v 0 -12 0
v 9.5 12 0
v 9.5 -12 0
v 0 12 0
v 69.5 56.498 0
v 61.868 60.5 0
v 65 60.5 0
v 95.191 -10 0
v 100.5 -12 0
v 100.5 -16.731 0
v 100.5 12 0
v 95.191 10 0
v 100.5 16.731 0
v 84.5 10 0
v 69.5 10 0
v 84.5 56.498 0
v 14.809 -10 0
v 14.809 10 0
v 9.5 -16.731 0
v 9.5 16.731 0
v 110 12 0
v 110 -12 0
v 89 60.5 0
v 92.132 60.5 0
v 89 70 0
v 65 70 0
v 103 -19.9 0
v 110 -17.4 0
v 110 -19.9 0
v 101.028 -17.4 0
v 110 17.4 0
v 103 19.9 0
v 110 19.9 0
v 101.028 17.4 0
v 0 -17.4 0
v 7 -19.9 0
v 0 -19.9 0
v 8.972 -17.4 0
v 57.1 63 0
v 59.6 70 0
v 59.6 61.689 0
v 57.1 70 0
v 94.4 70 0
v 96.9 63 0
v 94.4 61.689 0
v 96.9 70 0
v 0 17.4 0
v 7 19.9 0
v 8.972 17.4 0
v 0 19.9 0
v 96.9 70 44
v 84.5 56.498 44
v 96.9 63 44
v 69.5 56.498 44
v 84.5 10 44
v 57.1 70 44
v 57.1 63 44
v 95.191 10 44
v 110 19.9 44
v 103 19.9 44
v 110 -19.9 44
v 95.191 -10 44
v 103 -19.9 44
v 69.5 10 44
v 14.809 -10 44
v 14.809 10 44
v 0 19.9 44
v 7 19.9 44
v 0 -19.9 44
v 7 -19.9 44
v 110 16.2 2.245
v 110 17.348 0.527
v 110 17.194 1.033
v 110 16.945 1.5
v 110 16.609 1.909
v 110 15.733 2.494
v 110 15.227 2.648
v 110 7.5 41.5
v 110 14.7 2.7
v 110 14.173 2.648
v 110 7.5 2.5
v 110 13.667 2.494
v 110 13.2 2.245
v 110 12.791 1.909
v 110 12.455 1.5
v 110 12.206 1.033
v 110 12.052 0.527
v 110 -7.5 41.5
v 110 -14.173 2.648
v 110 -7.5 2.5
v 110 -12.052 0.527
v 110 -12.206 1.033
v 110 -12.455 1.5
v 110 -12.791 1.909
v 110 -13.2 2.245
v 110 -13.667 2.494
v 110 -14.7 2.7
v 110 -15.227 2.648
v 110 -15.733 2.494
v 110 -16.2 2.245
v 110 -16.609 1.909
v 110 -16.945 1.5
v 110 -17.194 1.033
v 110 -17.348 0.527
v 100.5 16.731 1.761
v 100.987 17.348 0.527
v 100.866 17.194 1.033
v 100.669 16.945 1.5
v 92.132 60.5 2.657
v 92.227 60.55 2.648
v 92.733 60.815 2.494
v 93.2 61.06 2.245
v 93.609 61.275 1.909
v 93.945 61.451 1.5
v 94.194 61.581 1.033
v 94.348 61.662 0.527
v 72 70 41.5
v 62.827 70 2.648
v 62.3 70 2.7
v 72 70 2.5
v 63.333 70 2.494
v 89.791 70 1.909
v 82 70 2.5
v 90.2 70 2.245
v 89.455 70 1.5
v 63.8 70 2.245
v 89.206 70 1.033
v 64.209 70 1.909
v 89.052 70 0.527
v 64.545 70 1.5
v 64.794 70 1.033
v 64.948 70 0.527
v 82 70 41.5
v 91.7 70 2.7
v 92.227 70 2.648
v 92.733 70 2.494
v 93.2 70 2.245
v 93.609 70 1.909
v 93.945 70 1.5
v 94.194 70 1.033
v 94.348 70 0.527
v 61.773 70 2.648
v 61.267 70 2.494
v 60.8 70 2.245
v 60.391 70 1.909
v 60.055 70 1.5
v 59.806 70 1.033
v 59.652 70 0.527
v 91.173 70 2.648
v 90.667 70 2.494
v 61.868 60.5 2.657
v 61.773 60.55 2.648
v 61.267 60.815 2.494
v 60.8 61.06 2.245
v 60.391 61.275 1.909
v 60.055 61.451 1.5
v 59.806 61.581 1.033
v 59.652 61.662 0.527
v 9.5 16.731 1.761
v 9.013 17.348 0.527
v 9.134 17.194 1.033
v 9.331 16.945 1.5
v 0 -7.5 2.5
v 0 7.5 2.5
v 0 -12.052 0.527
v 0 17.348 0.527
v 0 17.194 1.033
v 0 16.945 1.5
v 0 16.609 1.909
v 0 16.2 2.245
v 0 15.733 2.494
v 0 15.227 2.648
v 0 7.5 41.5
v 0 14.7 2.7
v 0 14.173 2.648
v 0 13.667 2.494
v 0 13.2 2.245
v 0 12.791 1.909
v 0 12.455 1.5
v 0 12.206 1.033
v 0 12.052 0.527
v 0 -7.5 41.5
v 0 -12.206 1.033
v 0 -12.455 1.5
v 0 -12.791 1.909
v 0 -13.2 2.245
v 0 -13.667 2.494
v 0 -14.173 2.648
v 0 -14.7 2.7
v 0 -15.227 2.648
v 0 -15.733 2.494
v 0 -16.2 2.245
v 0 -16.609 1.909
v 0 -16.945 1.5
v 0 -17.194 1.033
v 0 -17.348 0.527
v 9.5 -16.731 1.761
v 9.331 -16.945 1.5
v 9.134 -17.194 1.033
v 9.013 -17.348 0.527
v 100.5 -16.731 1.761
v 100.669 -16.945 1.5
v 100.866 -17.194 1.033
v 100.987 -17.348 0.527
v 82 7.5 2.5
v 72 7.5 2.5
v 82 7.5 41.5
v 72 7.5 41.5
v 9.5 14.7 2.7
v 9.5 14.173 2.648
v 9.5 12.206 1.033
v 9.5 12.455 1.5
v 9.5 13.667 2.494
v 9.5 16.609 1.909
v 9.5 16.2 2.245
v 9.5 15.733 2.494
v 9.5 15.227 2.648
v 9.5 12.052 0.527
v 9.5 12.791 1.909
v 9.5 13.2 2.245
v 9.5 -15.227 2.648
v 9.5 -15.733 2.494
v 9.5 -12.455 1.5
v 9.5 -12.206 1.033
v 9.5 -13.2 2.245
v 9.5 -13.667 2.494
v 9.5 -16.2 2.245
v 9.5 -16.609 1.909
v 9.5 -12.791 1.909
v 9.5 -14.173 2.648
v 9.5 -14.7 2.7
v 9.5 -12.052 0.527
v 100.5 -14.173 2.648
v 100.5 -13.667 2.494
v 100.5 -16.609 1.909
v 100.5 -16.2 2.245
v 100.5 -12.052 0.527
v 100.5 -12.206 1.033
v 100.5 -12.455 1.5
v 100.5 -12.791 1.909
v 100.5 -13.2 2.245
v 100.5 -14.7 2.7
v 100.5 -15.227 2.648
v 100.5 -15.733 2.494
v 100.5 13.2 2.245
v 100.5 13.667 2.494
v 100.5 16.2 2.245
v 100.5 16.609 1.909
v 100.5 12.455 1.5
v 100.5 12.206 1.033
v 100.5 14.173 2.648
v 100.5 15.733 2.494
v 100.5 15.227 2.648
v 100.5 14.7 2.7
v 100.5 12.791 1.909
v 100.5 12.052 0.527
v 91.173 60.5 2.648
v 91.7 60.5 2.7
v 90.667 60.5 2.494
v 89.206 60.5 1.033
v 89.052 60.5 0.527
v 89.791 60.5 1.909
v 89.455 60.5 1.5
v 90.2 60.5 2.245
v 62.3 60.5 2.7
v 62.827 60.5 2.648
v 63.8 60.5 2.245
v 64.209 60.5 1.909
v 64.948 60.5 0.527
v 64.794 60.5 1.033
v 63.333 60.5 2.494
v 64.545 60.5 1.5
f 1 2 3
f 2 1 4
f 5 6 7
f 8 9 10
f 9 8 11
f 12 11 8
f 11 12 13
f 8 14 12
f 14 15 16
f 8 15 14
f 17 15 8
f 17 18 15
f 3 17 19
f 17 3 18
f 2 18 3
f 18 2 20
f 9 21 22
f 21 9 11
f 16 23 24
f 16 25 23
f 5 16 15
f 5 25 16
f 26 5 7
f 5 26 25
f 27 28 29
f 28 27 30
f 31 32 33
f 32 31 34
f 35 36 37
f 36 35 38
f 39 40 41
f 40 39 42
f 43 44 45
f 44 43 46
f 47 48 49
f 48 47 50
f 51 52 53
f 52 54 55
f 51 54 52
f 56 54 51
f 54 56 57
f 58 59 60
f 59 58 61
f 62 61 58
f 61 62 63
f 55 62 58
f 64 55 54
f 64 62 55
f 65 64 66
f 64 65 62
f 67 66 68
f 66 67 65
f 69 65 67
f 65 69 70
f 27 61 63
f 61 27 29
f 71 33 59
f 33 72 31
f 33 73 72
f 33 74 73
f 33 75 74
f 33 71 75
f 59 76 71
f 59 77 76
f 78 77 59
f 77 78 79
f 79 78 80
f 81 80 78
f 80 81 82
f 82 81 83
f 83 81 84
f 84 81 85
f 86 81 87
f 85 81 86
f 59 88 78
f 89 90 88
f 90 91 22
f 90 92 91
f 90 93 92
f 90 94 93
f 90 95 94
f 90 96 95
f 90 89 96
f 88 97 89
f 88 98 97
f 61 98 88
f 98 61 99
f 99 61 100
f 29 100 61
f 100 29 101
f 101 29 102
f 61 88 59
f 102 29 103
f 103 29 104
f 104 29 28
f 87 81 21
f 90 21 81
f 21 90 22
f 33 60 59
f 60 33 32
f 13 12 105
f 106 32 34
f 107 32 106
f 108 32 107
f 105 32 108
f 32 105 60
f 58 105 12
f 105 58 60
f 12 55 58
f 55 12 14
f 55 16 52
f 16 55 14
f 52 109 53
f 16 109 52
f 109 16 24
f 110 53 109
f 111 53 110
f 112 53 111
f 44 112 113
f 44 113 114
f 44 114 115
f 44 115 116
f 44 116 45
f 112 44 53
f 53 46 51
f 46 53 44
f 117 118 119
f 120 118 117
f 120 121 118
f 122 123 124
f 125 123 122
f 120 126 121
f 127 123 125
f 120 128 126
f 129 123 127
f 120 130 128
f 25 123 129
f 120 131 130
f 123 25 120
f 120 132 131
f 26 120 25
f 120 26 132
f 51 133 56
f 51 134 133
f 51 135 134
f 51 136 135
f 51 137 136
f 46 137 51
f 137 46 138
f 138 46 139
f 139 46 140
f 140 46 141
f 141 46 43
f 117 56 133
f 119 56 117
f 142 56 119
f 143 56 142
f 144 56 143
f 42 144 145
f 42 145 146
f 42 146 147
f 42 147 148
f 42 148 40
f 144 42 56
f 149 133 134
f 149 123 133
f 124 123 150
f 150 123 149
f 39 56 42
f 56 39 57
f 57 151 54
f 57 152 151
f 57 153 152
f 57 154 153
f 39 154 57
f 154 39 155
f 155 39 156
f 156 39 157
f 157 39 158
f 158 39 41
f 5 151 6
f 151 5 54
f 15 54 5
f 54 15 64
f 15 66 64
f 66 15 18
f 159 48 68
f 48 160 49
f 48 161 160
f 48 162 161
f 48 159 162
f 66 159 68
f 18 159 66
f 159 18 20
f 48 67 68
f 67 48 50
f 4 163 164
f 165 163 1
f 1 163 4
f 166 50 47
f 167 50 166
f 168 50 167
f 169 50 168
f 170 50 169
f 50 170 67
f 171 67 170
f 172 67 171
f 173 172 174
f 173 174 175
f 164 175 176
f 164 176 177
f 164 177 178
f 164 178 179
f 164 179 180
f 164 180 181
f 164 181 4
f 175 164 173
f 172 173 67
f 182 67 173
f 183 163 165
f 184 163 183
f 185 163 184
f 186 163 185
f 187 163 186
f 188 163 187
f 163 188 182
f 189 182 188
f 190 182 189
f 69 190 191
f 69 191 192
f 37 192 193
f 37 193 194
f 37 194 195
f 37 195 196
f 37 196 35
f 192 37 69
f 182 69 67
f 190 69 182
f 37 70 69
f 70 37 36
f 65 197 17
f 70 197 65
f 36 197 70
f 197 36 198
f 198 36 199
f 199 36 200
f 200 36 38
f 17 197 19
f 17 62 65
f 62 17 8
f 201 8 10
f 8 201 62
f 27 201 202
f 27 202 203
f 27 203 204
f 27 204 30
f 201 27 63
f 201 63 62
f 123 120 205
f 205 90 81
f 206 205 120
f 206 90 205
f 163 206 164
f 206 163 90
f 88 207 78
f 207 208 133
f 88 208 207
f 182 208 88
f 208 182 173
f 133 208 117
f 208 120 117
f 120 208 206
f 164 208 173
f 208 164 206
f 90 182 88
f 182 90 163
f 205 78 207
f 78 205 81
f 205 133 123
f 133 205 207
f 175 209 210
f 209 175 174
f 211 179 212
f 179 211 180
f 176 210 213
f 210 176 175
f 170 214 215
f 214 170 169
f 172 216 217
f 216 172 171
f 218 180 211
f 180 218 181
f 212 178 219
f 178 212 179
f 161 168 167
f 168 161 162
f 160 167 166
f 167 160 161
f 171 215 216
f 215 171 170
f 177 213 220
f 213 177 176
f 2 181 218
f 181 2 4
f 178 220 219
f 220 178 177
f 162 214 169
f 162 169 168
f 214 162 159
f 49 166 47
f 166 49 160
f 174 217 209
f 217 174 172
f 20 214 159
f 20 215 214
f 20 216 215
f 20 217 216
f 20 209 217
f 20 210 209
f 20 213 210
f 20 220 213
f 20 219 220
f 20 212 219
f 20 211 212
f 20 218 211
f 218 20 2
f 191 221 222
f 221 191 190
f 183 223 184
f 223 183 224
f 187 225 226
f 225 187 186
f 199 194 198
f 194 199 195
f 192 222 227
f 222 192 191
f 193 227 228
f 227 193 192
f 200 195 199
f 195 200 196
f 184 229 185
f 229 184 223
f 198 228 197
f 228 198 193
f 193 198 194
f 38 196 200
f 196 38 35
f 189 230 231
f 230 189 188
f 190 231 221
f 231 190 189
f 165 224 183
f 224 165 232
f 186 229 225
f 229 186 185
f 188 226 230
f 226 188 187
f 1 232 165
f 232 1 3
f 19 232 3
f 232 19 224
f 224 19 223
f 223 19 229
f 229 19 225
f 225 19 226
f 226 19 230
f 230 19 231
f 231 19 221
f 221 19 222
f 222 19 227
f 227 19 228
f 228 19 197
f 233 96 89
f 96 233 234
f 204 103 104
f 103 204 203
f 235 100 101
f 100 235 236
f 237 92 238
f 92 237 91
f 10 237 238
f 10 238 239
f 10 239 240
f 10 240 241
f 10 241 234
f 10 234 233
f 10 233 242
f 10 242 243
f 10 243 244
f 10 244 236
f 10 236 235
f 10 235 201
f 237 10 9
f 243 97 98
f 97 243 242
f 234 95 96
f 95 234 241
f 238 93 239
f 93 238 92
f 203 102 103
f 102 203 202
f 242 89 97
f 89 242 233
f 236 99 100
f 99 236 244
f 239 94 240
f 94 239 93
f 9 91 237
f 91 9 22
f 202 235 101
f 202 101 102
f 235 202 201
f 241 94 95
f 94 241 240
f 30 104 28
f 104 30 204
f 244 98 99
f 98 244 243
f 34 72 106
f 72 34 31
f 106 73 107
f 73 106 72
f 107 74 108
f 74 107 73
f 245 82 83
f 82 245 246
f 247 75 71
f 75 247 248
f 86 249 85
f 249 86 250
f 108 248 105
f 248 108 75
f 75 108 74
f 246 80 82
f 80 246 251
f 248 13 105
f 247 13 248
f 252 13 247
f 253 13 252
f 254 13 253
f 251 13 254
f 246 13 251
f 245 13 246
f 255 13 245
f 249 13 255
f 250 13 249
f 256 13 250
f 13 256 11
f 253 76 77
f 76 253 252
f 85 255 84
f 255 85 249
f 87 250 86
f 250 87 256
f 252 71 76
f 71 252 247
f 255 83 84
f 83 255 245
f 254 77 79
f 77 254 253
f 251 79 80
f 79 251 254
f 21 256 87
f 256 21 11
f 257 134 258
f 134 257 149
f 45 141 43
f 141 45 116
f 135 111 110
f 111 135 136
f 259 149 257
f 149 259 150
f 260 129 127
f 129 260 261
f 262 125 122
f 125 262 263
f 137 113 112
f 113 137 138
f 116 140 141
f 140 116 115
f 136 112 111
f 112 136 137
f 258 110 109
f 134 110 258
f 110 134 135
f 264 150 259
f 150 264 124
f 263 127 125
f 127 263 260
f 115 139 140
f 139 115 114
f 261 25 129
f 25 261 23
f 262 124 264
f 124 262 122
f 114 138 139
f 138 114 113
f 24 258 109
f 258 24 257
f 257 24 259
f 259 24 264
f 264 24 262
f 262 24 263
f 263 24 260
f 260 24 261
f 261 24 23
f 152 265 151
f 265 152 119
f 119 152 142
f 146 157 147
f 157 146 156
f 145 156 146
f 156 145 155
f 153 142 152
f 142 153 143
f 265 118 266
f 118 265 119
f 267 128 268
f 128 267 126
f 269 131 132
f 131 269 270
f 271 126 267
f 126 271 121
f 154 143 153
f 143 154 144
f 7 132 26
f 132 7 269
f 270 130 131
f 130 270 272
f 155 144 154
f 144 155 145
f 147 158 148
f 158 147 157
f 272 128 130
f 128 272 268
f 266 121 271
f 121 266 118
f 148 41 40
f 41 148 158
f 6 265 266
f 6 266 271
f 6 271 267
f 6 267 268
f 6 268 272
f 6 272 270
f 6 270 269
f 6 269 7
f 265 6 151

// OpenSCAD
$fn = 32;

// ----------------------------------------------------------------------
// Air duct: 20 mm duct, 2.5 mm wall, 44 mm across
// ----------------------------------------------------------------------

// --- parameters (mm) ---
duct_r = 10;              // duct core radius
duct_d = 20;              // duct core diameter
wall = 2.5;               // duct wall thickness
height = 44;              // duct width (extrusion height)
port_r = 19.9;            // port flange half width
port_d = 39.8;            // port flange width
port_t = 7;               // port flange thickness
bolt_d = 5.4;             // port bolt holes
bolt_offset = 14.7;       // bolt hole offset from the port axis
branch_r = 7.5;           // branch core radius
branch_d = 15;            // branch core diameter
branch_len = 70;          // branch length from the run axis

difference() {
  /* outer hull chain: tube with a flat flange plate at every port */
  linear_extrude(height = 44) {
    hull() {
      polygon([[0, -19.9], [0, 19.9], [7, 19.9], [7, -19.9]]);
      translate([10, 0]) circle(r = 10);
    }
    hull() {
      translate([10, 0]) circle(r = 10);
      translate([33, 0]) circle(r = 10);
    }
    hull() {
      translate([33, 0]) circle(r = 10);
      translate([77, 0]) circle(r = 10);
    }
    hull() {
      translate([77, 0]) circle(r = 10);
      translate([100, 0]) circle(r = 10);
    }
    hull() {
      translate([100, 0]) circle(r = 10);
      polygon([[110, 19.9], [110, -19.9], [103, -19.9], [103, 19.9]]);
    }
    hull() {
      translate([77, 0]) circle(r = 7.5);
      translate([77, 38.5]) circle(r = 7.5);
    }
    hull() {
      translate([77, 38.5]) circle(r = 7.5);
      translate([77, 61]) circle(r = 7.5);
    }
    hull() {
      translate([77, 61]) circle(r = 7.5);
      polygon([[57.1, 70], [96.9, 70], [96.9, 63], [57.1, 63]]);
    }
  }
  /* air passage: the same chain inset by the wall, 5 mm proud of the ports */
  translate([0, 0, 2.5]) linear_extrude(height = 39) {
    hull() {
      translate([-5, 0]) circle(r = 7.5);
      translate([33, 0]) circle(r = 7.5);
    }
    hull() {
      translate([33, 0]) circle(r = 7.5);
      translate([77, 0]) circle(r = 7.5);
    }
    hull() {
      translate([77, 0]) circle(r = 7.5);
      translate([115, 0]) circle(r = 7.5);
    }
    hull() {
      translate([77, 0]) circle(r = 5);
      translate([77, 38.5]) circle(r = 5);
    }
    hull() {
      translate([77, 38.5]) circle(r = 5);
      translate([77, 75]) circle(r = 5);
    }
  }
  translate([0, 0]) rotate([0, 0, -90]) translate([-14.7, -2.5]) rotate([-90, 0, 0]) cylinder(h = 12, d = 5.4);
  translate([0, 0]) rotate([0, 0, -90]) translate([14.7, -2.5]) rotate([-90, 0, 0]) cylinder(h = 12, d = 5.4);
  translate([110, 0]) rotate([0, 0, 90]) translate([-14.7, -2.5]) rotate([-90, 0, 0]) cylinder(h = 12, d = 5.4);
  translate([110, 0]) rotate([0, 0, 90]) translate([14.7, -2.5]) rotate([-90, 0, 0]) cylinder(h = 12, d = 5.4);
  translate([77, 70]) rotate([0, 0, 180]) translate([-14.7, -2.5]) rotate([-90, 0, 0]) cylinder(h = 12, d = 5.4);
  translate([77, 70]) rotate([0, 0, 180]) translate([14.7, -2.5]) rotate([-90, 0, 0]) cylinder(h = 12, d = 5.4);
}
